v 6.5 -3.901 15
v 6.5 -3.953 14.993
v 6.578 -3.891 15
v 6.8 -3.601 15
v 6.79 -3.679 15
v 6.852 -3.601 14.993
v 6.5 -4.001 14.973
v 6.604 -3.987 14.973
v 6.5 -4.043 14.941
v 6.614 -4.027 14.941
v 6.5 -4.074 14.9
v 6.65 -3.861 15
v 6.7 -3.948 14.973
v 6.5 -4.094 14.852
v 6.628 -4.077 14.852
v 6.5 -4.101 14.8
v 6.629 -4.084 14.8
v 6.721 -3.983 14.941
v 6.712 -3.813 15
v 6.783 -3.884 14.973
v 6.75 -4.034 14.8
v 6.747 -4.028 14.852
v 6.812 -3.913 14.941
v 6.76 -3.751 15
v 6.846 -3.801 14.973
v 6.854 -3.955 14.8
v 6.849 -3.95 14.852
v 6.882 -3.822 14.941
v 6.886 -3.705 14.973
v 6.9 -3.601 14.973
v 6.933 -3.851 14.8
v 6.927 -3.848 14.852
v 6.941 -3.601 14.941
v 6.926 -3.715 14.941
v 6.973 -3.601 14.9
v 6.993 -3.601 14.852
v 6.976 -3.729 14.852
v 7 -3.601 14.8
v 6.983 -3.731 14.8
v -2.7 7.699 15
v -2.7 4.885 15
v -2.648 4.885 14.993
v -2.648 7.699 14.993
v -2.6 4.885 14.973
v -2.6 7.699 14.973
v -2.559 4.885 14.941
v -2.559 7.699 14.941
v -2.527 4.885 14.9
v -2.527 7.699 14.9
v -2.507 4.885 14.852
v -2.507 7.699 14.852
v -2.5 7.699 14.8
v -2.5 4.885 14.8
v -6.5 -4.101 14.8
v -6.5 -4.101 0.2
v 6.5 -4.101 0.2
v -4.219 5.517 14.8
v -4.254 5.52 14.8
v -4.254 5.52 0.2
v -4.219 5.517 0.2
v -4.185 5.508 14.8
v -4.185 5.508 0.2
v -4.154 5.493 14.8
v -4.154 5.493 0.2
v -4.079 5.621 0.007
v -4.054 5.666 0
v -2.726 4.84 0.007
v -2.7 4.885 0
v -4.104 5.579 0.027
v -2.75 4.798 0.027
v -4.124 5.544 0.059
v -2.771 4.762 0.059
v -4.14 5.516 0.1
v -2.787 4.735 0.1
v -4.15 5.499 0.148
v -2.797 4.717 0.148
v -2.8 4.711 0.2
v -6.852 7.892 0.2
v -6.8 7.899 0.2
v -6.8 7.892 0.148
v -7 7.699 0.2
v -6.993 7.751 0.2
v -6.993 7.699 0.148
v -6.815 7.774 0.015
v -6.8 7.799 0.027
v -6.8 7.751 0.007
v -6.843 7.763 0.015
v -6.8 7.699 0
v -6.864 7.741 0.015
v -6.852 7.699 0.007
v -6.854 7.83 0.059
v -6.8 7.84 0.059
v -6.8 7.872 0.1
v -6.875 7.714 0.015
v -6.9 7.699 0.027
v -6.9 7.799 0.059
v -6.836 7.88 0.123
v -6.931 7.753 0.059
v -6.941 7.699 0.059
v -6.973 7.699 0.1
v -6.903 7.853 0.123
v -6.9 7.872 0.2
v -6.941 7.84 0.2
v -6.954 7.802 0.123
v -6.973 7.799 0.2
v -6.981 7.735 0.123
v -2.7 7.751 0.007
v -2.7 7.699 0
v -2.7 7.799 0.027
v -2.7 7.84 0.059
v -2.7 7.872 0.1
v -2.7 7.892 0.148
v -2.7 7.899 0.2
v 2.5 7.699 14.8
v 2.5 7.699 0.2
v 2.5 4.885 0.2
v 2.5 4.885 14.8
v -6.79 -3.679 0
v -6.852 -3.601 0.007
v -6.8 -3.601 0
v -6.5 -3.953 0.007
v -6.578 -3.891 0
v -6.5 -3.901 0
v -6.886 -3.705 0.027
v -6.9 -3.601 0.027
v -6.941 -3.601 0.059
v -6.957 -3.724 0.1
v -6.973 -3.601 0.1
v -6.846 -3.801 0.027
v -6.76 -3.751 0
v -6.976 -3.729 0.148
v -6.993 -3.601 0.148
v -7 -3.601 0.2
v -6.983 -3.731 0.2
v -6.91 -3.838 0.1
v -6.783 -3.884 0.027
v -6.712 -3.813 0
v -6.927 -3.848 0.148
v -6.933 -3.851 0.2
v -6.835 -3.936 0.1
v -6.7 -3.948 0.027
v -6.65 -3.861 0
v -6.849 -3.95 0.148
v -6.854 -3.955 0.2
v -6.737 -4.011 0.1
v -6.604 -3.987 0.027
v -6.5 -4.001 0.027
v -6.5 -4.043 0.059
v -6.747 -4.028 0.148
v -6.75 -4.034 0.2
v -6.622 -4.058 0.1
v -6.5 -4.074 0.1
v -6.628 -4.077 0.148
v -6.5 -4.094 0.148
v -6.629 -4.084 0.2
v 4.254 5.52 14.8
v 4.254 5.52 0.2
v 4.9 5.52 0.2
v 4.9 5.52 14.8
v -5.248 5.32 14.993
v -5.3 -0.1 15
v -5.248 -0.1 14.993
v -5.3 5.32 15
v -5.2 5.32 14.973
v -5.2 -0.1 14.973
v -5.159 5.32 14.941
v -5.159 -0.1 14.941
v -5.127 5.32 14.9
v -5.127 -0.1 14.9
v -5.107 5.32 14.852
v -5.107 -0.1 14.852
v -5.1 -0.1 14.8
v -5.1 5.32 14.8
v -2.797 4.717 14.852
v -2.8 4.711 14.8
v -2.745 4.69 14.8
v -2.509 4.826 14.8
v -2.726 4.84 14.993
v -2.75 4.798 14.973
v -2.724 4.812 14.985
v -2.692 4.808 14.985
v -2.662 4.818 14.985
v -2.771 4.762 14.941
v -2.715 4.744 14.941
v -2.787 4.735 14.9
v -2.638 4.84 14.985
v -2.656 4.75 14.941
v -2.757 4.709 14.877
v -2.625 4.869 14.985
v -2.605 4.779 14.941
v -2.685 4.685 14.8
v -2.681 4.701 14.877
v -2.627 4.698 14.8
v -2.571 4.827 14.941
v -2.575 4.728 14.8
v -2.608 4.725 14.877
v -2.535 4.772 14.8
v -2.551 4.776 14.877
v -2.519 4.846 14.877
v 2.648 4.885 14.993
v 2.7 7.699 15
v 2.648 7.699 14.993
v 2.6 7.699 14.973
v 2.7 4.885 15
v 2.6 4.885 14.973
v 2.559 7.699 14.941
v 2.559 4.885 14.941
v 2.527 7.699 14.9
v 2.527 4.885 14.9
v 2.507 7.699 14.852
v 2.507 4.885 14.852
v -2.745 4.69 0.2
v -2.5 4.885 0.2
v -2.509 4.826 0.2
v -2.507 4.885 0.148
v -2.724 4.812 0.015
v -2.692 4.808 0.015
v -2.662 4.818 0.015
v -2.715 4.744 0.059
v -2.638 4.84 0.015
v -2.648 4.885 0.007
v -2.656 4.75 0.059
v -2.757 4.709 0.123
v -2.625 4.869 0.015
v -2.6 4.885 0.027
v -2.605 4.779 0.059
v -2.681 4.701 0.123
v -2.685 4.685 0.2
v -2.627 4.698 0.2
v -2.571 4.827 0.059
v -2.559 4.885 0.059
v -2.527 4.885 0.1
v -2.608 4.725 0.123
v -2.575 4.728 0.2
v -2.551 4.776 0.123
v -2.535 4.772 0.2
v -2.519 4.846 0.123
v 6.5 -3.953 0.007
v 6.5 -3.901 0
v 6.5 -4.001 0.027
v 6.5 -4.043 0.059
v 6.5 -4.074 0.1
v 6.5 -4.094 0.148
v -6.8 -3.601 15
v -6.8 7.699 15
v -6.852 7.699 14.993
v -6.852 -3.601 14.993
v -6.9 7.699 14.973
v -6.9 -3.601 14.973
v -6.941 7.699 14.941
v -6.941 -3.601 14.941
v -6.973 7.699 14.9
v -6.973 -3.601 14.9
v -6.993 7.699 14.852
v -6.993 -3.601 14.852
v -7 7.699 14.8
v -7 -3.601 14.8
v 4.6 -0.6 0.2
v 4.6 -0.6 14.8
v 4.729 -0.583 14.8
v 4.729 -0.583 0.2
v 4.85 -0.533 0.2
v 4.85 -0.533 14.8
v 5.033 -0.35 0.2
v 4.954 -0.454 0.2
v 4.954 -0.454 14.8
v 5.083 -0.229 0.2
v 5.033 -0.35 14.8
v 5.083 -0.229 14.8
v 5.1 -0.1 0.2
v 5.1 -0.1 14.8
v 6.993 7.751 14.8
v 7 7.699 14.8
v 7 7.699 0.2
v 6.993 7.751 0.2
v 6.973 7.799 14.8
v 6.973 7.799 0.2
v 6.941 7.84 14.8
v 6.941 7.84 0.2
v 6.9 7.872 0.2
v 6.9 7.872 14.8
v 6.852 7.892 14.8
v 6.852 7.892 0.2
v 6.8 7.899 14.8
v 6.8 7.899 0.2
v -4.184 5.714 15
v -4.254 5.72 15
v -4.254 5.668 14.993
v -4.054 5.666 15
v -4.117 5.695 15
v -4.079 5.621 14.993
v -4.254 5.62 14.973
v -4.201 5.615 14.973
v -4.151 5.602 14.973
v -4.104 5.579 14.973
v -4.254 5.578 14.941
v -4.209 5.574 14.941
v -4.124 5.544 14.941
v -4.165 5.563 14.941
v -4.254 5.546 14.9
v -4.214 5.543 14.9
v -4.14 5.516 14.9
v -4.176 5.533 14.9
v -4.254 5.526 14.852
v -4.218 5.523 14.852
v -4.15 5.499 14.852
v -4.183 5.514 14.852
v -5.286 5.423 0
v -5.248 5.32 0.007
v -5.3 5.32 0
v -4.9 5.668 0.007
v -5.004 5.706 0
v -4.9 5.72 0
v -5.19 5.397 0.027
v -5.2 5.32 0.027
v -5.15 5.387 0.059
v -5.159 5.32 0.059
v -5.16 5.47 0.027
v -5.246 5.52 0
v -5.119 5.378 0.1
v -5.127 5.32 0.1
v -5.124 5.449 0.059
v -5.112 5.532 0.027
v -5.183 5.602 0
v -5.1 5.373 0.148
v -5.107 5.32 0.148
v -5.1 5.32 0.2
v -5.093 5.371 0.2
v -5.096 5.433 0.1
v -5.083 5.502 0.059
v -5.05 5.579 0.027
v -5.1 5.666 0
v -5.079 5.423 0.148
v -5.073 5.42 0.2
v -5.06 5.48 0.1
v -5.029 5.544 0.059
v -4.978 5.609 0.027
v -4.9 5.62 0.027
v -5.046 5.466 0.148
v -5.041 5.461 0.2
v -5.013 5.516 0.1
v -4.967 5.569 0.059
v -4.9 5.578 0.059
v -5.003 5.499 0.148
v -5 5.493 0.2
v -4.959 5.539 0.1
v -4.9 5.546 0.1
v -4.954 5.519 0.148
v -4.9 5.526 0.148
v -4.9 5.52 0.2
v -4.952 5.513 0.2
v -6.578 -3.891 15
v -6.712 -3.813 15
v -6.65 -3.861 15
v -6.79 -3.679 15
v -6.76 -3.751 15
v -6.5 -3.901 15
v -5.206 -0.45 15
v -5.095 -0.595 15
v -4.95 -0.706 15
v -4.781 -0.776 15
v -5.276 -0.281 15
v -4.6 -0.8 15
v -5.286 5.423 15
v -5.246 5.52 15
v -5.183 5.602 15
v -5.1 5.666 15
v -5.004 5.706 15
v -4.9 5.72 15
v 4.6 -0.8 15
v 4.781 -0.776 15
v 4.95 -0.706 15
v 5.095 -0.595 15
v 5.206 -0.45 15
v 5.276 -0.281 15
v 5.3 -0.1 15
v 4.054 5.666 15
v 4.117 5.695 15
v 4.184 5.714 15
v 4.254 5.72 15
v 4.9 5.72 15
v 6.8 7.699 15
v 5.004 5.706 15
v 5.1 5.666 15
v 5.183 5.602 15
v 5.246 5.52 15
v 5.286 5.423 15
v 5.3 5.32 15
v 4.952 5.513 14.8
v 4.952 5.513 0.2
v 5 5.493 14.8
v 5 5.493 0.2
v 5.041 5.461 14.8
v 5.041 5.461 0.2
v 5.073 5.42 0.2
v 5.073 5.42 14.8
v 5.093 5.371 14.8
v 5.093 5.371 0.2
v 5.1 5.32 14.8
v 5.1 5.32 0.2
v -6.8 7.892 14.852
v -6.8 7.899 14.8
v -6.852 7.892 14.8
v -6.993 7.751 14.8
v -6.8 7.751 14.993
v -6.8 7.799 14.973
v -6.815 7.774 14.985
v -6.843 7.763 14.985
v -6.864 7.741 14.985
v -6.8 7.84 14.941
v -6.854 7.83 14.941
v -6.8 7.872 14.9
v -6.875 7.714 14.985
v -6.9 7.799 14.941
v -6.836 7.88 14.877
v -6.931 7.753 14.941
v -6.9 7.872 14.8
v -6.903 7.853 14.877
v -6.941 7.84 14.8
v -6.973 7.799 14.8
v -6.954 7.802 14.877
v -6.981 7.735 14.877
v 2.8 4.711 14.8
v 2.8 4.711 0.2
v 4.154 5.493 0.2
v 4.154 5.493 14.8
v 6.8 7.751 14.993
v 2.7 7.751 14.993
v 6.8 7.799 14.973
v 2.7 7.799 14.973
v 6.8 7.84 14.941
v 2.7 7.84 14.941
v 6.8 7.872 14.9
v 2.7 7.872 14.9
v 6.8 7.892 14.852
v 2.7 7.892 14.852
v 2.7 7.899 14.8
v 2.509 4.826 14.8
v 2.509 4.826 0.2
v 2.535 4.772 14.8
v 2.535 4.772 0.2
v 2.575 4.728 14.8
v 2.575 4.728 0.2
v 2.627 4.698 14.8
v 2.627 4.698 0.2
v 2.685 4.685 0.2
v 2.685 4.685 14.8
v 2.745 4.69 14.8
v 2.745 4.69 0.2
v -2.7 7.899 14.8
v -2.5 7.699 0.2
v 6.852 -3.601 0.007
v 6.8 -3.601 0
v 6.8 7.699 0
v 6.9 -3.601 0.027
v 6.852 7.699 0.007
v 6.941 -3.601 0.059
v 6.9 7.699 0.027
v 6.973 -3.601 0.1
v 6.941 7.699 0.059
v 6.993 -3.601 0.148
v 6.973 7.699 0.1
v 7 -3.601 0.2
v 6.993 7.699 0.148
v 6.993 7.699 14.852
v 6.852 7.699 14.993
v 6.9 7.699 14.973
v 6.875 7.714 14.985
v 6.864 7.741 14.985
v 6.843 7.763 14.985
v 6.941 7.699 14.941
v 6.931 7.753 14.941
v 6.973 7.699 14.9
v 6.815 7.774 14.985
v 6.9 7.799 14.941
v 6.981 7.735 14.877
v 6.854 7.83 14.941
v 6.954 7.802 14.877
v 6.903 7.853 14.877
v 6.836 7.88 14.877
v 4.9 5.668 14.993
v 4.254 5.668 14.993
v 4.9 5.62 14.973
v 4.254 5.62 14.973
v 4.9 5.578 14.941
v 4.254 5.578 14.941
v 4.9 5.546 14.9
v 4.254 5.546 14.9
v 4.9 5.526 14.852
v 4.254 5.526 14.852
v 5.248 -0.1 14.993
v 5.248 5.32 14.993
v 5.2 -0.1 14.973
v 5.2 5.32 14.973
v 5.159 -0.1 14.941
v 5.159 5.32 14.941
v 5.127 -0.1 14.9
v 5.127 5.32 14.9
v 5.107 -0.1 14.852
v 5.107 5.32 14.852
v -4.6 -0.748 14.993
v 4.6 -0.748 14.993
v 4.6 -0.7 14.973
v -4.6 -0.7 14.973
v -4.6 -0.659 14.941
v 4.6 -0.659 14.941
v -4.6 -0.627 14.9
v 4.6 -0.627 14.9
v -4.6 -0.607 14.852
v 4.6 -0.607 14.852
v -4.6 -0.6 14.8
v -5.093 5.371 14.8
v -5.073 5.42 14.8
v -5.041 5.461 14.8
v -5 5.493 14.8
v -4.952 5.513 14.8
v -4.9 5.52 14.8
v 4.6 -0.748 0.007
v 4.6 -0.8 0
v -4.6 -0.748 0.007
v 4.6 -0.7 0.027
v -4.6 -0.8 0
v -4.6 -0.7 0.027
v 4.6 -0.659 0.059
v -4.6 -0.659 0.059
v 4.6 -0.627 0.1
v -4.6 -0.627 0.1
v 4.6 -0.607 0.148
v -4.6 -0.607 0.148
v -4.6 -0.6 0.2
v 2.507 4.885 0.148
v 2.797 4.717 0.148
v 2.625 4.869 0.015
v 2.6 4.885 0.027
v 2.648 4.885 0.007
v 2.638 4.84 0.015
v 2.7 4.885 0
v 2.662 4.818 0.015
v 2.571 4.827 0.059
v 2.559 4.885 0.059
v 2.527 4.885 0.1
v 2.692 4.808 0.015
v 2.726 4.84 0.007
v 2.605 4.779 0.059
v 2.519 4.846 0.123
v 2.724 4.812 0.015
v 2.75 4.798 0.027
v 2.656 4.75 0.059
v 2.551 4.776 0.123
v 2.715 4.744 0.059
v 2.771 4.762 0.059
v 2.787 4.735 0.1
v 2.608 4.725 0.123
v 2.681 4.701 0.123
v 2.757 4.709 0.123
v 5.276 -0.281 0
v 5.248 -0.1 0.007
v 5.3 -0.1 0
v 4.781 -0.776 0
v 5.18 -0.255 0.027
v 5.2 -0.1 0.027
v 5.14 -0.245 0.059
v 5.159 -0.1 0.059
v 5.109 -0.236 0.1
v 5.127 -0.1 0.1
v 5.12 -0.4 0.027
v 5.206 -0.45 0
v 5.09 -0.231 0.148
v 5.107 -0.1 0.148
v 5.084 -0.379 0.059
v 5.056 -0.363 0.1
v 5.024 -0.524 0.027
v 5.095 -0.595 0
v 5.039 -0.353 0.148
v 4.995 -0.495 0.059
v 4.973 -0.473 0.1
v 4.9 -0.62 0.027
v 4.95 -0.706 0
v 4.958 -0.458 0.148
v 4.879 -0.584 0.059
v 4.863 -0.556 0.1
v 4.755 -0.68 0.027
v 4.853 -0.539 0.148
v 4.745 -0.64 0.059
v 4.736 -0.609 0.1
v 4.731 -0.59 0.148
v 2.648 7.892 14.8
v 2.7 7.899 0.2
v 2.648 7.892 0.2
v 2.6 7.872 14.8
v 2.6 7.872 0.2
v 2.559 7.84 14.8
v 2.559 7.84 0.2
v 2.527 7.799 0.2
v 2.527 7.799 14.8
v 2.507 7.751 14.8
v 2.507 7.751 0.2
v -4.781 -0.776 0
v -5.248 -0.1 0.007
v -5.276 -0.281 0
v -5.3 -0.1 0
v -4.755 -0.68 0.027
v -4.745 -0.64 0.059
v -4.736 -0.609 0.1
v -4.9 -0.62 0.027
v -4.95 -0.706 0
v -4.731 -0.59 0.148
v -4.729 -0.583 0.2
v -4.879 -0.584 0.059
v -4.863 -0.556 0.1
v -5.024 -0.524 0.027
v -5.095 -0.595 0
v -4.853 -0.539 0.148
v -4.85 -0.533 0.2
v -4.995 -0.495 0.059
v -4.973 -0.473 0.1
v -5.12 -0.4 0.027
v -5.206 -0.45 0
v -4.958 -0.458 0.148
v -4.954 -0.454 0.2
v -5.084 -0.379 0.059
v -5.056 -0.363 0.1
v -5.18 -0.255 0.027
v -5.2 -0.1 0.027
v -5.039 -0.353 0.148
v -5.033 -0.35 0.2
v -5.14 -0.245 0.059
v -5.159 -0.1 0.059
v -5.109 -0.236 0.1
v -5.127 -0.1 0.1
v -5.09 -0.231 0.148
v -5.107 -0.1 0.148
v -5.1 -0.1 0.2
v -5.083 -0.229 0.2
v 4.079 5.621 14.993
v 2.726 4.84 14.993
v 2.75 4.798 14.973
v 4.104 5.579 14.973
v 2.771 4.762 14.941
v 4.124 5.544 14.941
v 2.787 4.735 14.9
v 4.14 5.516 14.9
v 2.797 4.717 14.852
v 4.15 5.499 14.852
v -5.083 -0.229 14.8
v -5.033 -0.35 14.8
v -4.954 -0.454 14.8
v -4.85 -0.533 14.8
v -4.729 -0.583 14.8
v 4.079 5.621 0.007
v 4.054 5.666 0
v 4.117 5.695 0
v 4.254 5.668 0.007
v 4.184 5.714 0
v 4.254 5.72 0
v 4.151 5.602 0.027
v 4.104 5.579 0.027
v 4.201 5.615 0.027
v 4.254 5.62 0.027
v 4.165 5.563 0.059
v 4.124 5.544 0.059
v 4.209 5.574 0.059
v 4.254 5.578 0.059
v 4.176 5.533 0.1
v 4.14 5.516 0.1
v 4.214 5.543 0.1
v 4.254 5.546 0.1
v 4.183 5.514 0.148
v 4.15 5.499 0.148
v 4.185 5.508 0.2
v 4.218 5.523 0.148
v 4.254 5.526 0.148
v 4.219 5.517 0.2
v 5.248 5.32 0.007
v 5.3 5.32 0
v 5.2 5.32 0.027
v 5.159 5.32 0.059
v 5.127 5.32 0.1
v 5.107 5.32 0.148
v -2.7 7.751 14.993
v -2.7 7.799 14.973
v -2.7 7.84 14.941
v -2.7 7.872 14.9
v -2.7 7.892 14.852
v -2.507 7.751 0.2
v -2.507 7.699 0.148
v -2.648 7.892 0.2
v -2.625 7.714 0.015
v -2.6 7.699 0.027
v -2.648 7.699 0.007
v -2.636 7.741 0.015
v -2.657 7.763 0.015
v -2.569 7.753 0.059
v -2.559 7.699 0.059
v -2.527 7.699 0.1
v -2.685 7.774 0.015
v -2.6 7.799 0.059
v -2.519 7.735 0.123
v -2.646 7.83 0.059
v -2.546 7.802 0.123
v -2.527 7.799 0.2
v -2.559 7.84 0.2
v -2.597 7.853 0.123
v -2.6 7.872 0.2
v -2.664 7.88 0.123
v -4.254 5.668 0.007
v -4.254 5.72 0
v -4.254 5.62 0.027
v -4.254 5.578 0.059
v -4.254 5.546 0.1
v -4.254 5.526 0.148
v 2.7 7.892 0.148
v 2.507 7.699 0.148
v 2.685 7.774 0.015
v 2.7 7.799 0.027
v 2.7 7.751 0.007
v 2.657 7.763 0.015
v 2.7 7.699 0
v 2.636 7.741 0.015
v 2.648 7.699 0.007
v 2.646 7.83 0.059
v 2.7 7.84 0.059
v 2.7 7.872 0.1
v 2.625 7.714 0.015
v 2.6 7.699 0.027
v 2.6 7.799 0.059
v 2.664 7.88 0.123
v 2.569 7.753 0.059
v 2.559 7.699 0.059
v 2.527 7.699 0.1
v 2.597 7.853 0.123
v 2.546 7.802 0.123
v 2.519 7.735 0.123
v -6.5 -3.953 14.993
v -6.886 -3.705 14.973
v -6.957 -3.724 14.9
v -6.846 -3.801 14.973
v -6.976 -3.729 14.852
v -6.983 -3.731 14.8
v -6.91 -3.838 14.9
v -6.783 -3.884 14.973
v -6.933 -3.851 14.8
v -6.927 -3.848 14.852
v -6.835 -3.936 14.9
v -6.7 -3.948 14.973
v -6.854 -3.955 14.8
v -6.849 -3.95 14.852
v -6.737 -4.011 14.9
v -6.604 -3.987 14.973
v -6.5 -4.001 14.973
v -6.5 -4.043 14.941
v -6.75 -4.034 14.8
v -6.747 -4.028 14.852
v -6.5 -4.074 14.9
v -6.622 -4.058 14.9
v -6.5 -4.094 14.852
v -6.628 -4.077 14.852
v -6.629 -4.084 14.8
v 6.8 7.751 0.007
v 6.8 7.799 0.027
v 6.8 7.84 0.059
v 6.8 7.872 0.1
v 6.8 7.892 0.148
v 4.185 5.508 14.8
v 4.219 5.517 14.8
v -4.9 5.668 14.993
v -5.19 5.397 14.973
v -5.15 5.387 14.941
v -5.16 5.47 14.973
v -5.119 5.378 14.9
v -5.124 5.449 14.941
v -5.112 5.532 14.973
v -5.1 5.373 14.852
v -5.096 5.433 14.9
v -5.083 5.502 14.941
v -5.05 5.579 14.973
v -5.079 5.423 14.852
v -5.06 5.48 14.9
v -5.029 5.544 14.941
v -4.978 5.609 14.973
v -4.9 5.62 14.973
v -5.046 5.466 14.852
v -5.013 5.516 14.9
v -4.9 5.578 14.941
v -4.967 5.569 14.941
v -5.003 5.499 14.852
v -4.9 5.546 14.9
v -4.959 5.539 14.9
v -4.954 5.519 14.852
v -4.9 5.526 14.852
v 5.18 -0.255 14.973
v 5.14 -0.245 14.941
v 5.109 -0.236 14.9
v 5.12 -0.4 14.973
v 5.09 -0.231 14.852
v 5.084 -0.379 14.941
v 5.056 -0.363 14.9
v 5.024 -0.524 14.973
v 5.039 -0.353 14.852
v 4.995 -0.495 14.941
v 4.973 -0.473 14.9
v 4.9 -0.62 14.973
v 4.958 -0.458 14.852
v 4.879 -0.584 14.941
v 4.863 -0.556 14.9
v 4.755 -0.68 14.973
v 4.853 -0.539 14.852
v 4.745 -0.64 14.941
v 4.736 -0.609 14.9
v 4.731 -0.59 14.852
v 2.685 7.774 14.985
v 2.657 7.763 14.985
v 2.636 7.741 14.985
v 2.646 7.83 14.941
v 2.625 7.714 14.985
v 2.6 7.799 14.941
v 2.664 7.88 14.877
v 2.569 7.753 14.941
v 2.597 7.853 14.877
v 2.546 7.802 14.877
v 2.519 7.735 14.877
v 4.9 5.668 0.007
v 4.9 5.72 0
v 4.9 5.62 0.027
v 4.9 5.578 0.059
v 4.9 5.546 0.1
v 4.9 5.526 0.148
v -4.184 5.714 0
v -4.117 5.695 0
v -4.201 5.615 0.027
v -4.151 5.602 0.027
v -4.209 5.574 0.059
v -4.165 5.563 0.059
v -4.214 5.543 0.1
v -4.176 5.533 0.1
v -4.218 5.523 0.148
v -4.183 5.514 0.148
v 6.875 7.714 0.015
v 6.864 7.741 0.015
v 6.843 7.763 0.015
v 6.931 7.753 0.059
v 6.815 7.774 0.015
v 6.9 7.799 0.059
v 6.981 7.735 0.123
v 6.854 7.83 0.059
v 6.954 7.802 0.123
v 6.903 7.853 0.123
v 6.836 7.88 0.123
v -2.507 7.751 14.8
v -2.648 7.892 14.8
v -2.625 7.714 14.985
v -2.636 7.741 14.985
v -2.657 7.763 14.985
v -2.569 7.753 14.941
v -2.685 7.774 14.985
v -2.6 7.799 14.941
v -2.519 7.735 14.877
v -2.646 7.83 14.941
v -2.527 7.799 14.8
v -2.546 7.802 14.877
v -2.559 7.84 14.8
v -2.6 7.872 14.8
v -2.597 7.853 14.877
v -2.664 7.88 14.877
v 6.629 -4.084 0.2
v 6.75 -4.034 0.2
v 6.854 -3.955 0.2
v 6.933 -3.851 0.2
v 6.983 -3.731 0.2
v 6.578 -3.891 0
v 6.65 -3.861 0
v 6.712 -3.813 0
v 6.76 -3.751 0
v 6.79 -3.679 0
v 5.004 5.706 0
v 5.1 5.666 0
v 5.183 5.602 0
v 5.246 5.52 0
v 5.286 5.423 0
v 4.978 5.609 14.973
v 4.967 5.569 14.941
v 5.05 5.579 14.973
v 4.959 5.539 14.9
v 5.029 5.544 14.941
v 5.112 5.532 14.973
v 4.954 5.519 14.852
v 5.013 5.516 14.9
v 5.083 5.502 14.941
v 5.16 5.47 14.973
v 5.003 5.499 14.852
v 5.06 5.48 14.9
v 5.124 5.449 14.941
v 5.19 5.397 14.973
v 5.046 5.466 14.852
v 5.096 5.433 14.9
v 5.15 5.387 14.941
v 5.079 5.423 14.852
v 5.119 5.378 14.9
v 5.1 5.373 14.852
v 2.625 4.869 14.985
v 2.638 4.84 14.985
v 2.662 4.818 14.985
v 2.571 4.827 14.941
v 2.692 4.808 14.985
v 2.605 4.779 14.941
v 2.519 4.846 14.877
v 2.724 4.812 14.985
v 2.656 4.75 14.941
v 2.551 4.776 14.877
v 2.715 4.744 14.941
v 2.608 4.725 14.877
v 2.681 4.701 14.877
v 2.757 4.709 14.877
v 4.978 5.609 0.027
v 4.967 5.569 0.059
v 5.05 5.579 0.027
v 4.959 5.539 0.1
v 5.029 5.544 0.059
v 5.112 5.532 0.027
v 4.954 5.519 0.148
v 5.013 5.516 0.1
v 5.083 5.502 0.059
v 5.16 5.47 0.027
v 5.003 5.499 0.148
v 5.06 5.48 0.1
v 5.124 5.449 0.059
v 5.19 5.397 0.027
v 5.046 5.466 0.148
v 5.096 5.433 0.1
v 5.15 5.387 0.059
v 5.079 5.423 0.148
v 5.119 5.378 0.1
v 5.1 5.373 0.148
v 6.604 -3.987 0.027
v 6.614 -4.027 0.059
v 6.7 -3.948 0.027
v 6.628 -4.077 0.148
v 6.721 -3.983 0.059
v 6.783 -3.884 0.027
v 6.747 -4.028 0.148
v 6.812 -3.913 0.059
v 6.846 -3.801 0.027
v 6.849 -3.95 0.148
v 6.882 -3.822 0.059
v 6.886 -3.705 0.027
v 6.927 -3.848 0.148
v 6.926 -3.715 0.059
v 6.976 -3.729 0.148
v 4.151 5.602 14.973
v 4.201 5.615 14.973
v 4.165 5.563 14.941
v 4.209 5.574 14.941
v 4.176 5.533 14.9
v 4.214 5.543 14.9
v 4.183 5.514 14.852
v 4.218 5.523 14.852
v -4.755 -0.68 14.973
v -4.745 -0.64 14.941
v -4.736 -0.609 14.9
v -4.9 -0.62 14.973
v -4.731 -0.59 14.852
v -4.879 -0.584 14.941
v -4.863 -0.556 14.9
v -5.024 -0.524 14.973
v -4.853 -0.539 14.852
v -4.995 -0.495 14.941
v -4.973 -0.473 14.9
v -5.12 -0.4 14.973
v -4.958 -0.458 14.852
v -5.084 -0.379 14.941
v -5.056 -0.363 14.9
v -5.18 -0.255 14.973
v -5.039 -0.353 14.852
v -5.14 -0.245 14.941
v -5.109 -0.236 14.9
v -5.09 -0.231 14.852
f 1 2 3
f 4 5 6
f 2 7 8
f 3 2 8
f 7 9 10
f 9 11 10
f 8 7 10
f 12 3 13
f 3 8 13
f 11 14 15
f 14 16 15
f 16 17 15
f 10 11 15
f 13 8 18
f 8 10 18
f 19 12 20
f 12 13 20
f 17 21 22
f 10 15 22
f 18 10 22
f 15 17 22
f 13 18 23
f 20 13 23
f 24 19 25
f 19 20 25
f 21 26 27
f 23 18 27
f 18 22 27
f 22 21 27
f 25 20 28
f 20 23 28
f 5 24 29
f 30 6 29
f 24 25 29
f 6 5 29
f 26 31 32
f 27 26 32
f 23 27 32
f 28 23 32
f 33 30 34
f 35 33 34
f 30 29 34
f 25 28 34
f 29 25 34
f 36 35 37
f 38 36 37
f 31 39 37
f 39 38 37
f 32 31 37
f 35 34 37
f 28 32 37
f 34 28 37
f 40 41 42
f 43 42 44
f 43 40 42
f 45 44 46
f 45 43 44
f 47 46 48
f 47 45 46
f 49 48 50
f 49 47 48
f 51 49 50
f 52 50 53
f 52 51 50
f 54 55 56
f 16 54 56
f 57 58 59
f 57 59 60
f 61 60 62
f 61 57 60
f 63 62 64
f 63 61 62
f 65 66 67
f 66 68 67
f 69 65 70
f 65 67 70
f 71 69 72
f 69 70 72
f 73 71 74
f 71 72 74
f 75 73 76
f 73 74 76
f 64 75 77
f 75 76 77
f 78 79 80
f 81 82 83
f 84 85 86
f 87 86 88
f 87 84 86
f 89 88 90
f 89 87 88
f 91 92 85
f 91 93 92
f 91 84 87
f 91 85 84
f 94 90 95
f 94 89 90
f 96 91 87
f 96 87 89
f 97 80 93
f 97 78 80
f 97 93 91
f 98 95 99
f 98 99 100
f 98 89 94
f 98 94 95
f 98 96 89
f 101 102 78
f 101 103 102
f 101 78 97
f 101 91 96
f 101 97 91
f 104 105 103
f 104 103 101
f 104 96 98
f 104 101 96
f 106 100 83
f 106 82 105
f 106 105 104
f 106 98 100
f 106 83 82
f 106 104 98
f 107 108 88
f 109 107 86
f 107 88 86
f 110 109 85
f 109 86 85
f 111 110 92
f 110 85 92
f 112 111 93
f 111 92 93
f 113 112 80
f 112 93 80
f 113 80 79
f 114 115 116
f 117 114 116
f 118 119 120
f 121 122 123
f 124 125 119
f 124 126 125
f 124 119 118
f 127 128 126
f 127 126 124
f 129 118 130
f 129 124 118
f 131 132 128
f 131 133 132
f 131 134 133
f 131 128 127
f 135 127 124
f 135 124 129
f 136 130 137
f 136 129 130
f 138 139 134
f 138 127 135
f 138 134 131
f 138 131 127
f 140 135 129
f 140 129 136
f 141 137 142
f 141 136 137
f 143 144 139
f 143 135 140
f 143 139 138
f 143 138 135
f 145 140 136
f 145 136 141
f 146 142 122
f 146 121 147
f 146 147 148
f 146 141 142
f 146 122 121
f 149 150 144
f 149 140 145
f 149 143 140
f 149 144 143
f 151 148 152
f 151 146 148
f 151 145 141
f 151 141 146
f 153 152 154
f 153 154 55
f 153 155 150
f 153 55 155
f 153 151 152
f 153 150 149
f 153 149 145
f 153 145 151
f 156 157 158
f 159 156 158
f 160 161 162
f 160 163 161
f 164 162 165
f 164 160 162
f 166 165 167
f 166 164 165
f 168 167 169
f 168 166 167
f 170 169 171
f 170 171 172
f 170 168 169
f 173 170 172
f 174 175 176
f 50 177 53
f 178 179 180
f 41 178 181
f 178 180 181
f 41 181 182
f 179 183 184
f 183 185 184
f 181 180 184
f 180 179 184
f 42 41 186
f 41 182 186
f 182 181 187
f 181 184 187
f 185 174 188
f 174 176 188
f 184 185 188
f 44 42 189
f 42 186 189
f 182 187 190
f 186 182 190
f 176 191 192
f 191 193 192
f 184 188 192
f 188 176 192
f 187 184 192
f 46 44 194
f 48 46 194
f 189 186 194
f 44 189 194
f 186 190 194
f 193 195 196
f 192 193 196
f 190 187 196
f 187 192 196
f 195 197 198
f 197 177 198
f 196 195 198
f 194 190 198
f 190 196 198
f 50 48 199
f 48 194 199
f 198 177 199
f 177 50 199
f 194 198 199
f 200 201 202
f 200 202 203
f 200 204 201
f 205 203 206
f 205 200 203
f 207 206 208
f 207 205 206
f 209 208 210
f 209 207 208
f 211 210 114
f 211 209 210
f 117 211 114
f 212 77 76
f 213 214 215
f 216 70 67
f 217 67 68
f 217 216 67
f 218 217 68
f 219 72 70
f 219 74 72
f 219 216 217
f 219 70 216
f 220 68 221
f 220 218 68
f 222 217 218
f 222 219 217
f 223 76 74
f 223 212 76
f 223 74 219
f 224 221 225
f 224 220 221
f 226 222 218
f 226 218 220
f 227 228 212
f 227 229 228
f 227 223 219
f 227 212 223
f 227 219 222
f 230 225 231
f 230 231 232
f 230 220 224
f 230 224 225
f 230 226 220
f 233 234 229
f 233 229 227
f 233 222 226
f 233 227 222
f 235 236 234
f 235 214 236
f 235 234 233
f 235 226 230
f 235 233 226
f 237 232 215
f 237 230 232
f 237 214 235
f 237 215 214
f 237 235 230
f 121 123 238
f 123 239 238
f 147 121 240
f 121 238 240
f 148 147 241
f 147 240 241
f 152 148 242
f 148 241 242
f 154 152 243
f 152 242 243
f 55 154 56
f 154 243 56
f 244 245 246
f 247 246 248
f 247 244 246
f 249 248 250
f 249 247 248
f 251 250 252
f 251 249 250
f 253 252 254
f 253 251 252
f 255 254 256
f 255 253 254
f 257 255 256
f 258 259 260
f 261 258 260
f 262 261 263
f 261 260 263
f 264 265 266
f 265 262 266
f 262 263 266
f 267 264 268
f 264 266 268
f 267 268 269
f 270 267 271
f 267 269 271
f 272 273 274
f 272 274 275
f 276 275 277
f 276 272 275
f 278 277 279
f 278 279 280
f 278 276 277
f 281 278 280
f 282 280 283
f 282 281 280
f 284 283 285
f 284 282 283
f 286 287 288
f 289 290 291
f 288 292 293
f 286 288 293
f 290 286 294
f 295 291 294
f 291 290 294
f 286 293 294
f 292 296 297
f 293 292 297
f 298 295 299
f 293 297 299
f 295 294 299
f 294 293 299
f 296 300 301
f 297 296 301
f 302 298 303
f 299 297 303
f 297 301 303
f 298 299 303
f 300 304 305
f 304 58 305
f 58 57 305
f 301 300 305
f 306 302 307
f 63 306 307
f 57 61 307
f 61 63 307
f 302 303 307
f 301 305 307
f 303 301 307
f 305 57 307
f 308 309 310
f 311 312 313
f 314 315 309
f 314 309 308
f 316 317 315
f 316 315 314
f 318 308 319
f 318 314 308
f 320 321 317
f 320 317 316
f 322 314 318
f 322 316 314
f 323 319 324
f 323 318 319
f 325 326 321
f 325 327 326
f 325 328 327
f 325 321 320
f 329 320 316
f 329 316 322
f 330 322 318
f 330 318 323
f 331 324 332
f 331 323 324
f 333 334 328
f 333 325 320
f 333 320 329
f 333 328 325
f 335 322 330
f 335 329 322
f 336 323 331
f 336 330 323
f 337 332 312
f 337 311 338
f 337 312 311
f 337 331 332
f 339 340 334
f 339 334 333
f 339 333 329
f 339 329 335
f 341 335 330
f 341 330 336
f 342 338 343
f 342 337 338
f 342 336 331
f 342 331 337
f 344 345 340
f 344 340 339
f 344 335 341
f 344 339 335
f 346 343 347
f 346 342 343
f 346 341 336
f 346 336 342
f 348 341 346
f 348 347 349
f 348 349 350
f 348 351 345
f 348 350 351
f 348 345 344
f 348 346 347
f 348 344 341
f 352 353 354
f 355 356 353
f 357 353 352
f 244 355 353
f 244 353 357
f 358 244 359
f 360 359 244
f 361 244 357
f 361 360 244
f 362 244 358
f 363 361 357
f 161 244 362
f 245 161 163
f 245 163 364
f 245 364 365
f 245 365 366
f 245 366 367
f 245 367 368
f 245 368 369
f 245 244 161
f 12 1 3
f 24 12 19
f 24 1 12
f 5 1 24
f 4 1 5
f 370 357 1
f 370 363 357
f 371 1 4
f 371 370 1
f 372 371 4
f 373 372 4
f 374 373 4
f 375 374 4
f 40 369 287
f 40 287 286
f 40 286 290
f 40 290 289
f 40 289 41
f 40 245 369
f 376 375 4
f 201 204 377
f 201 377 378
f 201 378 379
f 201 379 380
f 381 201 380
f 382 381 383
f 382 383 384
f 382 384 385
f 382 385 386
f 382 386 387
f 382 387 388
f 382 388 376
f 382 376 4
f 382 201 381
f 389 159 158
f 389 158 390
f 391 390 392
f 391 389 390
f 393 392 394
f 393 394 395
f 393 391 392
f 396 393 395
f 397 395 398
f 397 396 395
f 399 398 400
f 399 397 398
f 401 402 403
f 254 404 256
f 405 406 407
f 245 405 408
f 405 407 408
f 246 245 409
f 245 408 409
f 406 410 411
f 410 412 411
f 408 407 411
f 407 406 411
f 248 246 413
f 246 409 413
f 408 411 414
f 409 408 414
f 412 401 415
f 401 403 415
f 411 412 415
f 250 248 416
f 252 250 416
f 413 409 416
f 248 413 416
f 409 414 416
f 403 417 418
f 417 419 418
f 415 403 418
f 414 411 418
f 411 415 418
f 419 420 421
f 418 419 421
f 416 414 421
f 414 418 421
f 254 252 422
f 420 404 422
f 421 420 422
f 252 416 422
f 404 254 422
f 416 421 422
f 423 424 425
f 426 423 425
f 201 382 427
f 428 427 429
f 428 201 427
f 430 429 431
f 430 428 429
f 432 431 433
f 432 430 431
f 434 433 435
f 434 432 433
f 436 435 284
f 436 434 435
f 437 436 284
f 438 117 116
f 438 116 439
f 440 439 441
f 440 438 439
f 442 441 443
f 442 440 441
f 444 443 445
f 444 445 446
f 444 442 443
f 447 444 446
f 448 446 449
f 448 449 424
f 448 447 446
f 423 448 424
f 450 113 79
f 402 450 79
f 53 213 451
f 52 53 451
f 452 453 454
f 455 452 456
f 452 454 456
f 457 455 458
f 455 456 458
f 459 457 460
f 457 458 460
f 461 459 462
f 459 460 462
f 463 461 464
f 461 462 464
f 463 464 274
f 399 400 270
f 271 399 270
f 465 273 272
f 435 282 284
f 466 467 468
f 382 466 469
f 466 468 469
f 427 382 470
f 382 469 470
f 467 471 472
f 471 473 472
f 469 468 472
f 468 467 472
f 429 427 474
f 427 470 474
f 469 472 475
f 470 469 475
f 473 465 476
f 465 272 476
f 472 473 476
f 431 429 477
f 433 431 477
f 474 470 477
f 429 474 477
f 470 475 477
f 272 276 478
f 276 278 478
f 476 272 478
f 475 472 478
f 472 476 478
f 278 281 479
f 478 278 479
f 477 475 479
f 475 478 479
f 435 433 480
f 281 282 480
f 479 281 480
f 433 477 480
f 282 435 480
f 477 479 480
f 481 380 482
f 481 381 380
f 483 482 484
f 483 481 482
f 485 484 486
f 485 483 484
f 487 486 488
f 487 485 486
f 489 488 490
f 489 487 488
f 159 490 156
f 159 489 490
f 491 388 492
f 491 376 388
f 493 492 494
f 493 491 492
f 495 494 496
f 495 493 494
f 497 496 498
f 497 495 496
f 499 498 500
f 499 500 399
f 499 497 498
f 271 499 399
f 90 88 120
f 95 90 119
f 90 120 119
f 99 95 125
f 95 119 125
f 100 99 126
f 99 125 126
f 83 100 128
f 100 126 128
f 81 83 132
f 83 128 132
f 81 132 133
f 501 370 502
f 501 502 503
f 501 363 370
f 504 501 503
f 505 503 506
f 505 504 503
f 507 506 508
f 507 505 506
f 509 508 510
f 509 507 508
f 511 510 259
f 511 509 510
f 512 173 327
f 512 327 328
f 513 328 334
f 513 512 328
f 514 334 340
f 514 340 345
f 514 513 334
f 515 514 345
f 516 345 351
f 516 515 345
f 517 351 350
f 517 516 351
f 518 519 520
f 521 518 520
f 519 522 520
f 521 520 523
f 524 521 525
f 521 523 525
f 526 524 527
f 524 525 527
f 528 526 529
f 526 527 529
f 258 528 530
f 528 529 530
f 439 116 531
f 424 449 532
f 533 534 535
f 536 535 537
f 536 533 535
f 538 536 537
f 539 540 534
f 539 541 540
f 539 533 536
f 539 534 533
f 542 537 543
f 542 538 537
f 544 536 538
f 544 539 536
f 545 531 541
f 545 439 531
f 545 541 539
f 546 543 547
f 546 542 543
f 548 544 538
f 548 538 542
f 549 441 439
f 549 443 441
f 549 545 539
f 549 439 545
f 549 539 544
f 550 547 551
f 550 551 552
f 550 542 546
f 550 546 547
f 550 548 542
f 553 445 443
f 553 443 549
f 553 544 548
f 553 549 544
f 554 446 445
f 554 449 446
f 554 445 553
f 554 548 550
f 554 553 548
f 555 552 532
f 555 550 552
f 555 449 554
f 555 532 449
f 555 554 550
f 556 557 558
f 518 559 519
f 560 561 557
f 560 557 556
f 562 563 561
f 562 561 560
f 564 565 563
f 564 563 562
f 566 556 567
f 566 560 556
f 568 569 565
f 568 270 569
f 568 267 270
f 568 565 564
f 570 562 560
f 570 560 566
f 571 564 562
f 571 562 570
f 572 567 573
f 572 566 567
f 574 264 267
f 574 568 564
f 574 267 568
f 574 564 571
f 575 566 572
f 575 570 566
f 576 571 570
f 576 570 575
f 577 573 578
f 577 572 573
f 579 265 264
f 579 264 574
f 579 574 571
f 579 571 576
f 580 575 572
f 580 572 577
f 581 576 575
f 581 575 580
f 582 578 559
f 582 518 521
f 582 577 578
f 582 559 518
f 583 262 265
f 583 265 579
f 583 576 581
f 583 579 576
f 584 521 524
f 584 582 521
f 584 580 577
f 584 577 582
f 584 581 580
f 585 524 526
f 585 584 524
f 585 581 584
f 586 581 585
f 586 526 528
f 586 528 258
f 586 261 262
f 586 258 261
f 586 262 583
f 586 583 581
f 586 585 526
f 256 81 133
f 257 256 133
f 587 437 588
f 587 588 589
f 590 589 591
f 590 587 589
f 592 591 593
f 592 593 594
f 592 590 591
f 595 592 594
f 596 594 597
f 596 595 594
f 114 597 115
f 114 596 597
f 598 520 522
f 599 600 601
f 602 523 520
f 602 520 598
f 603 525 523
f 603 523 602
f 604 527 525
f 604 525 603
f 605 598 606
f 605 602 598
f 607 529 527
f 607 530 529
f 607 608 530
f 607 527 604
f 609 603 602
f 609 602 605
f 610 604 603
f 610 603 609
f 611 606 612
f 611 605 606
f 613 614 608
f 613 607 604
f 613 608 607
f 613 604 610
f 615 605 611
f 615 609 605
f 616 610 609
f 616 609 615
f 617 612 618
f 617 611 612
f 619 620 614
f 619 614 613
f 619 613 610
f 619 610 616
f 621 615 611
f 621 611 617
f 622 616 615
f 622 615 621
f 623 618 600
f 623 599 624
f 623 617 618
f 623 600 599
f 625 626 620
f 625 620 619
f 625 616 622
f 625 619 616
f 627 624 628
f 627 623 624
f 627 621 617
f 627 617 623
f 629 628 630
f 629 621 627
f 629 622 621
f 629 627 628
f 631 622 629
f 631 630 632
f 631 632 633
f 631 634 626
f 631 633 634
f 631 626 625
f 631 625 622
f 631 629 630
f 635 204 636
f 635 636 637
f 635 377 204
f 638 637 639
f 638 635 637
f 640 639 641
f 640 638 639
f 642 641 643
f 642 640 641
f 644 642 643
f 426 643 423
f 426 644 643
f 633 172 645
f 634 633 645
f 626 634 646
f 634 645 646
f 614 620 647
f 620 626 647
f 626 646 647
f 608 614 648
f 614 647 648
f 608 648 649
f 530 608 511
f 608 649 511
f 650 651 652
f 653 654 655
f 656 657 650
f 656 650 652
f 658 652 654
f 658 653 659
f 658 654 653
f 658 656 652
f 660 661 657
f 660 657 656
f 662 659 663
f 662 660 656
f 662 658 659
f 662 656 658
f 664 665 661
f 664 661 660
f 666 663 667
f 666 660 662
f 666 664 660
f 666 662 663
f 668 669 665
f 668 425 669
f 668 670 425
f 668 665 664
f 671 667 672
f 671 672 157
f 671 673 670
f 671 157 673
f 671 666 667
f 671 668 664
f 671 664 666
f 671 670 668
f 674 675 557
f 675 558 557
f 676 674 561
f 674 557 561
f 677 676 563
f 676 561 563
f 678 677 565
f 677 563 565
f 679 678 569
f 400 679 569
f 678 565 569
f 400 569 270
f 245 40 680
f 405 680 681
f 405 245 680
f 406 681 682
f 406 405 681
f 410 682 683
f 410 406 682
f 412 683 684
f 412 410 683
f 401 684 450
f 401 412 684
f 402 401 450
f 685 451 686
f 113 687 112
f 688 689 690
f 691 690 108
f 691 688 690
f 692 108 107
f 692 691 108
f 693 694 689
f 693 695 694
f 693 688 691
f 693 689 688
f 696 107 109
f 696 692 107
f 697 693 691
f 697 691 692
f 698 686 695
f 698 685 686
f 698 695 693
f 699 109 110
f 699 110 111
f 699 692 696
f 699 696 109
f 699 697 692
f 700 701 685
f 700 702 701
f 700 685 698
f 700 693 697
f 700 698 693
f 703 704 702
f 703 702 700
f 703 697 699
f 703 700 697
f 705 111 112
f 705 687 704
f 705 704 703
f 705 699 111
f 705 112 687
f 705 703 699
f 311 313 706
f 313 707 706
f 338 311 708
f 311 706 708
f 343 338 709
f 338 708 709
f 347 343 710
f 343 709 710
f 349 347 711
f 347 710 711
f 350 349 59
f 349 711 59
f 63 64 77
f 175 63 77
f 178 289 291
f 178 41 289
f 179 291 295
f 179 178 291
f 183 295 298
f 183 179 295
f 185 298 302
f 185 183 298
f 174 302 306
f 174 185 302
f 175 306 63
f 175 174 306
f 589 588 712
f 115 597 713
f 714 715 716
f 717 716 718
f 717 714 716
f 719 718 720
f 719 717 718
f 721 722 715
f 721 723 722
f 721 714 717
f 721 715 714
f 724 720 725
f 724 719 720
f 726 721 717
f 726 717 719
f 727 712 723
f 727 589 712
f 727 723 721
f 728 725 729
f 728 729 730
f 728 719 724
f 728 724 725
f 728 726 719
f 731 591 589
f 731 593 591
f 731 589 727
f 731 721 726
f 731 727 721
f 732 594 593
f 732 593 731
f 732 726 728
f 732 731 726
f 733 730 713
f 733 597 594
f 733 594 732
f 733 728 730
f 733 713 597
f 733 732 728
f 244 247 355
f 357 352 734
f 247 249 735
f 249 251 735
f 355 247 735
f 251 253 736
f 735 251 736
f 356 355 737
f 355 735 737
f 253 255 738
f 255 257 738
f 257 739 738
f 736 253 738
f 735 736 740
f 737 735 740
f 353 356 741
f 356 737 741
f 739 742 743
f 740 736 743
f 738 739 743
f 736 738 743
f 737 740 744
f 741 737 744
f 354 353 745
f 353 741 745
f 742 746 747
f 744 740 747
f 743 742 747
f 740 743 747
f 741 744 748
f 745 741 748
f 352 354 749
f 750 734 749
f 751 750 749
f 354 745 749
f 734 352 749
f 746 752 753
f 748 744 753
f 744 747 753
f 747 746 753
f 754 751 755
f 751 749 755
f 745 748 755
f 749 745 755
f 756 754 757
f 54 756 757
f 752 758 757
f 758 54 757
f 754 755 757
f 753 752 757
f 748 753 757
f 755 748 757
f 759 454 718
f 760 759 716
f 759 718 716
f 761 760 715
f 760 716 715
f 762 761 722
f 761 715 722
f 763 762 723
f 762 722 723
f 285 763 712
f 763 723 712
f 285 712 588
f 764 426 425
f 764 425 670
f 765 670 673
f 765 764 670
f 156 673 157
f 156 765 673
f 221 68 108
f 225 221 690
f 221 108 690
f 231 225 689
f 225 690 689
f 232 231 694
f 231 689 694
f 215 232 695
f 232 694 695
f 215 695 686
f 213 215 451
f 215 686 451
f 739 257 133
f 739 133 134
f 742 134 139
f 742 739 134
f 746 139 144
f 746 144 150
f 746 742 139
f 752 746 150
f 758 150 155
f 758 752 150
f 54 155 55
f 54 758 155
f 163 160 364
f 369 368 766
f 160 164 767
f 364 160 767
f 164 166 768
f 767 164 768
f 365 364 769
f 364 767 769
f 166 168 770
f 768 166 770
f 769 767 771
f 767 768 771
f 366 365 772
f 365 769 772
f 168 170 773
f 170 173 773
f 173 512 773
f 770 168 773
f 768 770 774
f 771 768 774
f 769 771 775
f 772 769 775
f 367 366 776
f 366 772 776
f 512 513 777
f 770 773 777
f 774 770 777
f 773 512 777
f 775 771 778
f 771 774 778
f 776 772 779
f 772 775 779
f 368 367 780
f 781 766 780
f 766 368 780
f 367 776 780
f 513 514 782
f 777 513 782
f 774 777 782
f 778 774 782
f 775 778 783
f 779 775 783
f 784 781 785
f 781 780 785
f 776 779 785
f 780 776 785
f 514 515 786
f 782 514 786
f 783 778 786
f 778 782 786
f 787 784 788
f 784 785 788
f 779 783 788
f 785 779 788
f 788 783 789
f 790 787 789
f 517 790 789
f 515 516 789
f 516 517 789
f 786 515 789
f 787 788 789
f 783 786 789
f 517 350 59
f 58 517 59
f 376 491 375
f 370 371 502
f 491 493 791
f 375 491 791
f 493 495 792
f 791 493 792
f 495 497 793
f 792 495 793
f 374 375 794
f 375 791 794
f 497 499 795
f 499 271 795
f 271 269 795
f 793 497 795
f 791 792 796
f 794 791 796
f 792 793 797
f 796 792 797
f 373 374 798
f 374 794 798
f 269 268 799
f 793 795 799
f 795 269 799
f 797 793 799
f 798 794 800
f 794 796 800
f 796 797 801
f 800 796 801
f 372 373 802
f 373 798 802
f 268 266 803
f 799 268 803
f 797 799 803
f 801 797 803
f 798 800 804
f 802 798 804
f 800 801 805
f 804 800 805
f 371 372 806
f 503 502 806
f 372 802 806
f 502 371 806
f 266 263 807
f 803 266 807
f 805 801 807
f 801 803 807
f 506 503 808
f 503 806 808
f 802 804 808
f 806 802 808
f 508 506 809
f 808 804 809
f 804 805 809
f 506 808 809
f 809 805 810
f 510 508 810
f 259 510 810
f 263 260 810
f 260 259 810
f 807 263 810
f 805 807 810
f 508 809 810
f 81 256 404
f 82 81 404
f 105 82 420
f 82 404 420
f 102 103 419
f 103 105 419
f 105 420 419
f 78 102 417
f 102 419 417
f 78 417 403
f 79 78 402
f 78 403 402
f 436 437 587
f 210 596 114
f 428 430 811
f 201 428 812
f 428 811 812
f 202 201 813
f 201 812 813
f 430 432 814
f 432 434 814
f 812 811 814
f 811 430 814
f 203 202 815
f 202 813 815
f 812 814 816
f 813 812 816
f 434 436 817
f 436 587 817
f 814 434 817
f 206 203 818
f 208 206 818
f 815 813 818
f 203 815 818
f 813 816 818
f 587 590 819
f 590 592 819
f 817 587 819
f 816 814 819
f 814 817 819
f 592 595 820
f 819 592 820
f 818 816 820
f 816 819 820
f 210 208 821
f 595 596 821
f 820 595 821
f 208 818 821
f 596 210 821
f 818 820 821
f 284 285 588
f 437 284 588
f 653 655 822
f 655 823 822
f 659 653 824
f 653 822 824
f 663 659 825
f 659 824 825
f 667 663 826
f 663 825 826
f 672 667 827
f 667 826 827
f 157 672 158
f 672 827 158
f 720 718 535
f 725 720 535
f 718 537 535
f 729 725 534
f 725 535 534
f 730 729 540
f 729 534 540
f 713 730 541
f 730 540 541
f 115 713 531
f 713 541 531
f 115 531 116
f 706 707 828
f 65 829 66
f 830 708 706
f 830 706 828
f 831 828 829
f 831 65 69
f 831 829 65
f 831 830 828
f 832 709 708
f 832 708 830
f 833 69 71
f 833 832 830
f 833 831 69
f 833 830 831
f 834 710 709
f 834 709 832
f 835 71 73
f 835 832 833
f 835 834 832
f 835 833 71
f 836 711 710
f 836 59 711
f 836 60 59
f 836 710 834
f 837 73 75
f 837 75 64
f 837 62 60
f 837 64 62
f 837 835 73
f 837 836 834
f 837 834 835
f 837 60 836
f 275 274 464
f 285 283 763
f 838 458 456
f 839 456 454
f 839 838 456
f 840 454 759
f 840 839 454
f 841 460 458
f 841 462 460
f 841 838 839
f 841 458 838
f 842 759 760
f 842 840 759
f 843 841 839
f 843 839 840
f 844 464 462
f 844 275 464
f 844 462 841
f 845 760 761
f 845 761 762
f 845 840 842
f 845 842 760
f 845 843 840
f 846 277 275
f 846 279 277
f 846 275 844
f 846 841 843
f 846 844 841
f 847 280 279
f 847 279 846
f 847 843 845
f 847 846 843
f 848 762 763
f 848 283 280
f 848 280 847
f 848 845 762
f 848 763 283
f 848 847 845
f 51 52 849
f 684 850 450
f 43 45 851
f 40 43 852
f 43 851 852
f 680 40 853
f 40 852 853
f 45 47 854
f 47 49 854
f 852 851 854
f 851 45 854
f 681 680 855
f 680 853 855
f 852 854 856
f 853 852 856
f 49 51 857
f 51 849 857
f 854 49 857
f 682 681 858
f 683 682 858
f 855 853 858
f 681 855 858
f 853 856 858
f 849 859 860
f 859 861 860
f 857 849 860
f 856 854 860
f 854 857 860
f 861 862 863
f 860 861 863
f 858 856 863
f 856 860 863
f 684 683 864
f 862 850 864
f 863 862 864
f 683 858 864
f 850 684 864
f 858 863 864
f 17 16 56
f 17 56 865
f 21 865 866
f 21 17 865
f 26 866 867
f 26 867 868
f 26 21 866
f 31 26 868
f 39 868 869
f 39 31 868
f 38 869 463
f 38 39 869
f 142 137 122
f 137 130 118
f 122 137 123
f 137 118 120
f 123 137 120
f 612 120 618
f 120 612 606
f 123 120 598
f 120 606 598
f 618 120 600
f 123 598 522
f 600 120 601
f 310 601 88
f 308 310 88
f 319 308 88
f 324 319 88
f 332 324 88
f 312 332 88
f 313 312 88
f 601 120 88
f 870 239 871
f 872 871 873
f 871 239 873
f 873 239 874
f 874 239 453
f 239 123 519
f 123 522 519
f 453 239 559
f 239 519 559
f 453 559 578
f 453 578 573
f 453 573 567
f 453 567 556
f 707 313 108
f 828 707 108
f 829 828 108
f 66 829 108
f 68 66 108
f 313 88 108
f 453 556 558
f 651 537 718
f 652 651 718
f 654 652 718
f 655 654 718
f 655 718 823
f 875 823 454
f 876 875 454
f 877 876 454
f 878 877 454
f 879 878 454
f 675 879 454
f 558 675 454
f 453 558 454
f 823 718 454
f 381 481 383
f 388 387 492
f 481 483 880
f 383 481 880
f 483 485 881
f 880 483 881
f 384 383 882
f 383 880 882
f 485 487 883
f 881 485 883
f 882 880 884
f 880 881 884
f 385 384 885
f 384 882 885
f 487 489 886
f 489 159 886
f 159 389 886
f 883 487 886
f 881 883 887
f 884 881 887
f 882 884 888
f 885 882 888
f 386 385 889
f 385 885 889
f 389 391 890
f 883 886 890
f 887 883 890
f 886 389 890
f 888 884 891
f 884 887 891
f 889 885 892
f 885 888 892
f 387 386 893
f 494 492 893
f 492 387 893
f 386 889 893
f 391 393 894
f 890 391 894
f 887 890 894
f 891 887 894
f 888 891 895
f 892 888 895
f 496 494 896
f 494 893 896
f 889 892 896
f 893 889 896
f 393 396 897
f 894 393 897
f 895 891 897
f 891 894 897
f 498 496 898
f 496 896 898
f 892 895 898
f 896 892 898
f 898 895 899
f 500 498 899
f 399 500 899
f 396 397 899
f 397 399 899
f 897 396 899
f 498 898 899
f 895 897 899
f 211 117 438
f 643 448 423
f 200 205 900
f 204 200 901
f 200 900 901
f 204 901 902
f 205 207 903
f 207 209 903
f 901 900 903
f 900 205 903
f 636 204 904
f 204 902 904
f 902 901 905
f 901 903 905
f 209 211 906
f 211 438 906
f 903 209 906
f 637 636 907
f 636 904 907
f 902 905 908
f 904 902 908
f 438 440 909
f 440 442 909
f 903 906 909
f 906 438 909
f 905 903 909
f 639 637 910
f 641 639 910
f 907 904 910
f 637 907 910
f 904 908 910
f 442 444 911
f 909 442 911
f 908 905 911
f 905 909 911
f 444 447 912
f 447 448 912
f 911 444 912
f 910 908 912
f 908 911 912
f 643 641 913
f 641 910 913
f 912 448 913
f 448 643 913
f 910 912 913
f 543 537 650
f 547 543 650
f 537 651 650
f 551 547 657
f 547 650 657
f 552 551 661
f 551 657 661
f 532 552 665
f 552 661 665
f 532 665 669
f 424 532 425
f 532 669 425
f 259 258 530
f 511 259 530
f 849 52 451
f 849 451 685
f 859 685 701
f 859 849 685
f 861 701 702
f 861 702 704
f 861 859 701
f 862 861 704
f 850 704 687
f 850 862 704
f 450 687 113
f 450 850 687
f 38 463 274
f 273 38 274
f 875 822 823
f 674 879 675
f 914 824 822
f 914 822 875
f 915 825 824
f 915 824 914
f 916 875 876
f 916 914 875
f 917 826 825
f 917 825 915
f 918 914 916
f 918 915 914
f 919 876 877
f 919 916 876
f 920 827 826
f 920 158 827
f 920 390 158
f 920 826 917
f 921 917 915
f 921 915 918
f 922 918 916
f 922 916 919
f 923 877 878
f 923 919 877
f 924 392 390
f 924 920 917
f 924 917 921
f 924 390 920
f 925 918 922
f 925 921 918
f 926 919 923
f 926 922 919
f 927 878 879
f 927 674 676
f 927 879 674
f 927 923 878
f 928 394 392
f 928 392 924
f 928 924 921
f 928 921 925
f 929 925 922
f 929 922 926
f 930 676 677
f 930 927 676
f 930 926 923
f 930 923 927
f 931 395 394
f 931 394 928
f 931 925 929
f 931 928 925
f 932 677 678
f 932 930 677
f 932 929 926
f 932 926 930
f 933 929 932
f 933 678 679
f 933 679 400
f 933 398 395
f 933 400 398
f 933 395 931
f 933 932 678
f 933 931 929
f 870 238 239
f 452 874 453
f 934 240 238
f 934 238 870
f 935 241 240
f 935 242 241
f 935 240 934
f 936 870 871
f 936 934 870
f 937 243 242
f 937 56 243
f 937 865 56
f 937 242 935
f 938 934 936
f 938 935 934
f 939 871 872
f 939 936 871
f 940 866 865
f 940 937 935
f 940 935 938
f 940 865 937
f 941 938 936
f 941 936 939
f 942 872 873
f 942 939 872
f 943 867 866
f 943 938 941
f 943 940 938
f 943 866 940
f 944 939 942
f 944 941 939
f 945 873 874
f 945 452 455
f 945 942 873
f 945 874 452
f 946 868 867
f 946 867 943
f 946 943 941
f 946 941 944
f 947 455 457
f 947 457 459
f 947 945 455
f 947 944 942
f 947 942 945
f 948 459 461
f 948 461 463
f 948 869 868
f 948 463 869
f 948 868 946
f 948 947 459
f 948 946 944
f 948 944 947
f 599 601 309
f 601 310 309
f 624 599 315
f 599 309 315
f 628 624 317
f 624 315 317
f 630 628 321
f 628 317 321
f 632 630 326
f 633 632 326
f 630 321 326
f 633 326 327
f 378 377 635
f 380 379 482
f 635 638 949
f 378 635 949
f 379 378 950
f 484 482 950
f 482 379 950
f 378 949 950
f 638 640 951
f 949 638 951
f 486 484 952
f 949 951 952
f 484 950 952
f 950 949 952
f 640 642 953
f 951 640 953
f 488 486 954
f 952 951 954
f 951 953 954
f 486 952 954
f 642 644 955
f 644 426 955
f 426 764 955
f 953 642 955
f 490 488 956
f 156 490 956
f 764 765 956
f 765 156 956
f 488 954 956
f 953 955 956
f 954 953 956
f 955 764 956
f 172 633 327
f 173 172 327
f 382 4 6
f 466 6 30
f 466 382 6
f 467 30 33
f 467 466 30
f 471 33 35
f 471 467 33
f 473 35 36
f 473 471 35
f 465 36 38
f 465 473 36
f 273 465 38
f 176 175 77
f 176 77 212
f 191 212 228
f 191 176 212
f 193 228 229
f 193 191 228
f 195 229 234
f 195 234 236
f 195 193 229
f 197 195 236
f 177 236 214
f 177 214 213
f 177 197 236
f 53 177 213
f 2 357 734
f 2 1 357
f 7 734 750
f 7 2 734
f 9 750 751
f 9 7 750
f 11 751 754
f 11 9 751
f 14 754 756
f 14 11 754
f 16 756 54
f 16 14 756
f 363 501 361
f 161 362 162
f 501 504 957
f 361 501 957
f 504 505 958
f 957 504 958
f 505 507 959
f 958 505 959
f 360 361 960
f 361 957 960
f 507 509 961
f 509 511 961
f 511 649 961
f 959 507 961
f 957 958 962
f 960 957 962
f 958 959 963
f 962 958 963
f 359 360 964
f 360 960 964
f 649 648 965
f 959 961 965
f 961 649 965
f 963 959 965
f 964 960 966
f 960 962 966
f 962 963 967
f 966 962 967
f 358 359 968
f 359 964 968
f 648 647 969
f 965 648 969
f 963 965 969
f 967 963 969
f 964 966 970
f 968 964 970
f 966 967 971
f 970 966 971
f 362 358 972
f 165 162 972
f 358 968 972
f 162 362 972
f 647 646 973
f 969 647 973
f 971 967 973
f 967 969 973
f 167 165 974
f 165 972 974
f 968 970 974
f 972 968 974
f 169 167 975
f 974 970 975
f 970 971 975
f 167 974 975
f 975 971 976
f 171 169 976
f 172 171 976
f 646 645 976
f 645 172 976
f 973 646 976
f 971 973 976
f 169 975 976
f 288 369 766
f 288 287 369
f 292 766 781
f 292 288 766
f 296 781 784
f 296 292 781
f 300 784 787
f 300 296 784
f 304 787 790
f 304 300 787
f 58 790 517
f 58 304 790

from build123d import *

# Parameters (mm, degrees)
BOSS_EXTRUDE1_DEPTH = 15
FILLET1_R           = 0.2
FILLET2_R           = 0.5
FILLET3_R           = 0.2


with BuildPart() as part:
    # Sketch1 → Boss-Extrude1 (new body)
    with BuildSketch(Plane.XY):
        Polygon((-4.5, 5.519615242), (-4.5, 7.8988893), (-7, 7.8988893), (-7, -4.1011107), (7, -4.1011107), (7, 7.8988893), (4.5, 7.8988893), (4.5, 5.519615242), (5.1, 5.519615242), (5.1, -0.6), (-5.1, -0.6), (-5.1, 5.519615242), align=None)
        Polygon((-2.5, 7.8988893), (-4.5, 7.8988893), (-4.5, 5.519615242), (-4.2, 5.519615242), (-2.5, 4.538119785), align=None)
        Polygon((4.5, 7.8988893), (2.5, 7.8988893), (2.5, 4.538119785), (4.2, 5.519615242), (4.5, 5.519615242), align=None)
    extrude(amount=BOSS_EXTRUDE1_DEPTH)

    # Fillet1
    fillet1_edges = [part.edges().sort_by_distance(p)[0] for p in [
        (4.2, 5.519615242, 7.5),
        (2.5, 4.538119785, 7.5),
        (2.5, 7.8988893, 7.5),
        (7, 7.8988893, 7.5),
        (-7, 7.8988893, 7.5),
        (-2.5, 7.8988893, 7.5),
        (-2.5, 4.538119785, 7.5),
        (-4.2, 5.519615242, 7.5),
        (-5.1, 5.519615242, 7.5),
        (5.1, 5.519615242, 7.5),
    ]]
    fillet(fillet1_edges, radius=FILLET1_R)

    # Fillet2
    fillet2_edges = [part.edges().sort_by_distance(p)[0] for p in [
        (7, -4.1011107, 7.5),
        (-7, -4.1011107, 7.5),
        (-5.1, -0.6, 7.5),
        (5.1, -0.6, 7.5),
    ]]
    fillet(fillet2_edges, radius=FILLET2_R)

    # Fillet3
    fillet3_edges = [part.edges().sort_by_distance(p)[0] for p in [
        (0, -4.1011107, 0),
        (0, -4.1011107, 15),
        (0, -0.6, 0),
        (5.1, 2.609807621, 0),
        (7, 2.0488893, 0),
        (6.853553391, -3.95466409, 0),
        (-6.853553391, -3.95466409, 0),
        (7, 2.0488893, 15),
        (5.1, 2.609807621, 15),
        (0, -0.6, 15),
        (6.853553391, -3.95466409, 15),
        (-6.853553391, -3.95466409, 15),
        (-4.953553391, -0.453553391, 0),
        (-4.953553391, -0.453553391, 15),
        (4.953553391, -0.453553391, 0),
        (4.953553391, -0.453553391, 15),
        (4.576794919, 5.519615242, 0),
        (4.576794919, 5.519615242, 15),
        (3.476794919, 5.102072594, 0),
        (3.476794919, 5.102072594, 15),
        (-3.476794919, 5.102072594, 0),
        (-3.476794919, 5.102072594, 15),
        (-4.576794919, 5.519615242, 0),
        (-4.576794919, 5.519615242, 15),
        (-5.1, 2.609807621, 0),
        (-5.1, 2.609807621, 15),
        (-7, 2.0488893, 0),
        (-7, 2.0488893, 15),
        (2.5, 6.291709623, 0),
        (4.75, 7.8988893, 0),
        (-4.75, 7.8988893, 0),
        (-2.5, 6.291709623, 0),
        (2.6, 4.711324865, 0),
        (-2.6, 4.711324865, 0),
        (-2.558578644, 7.840310656, 0),
        (2.558578644, 7.840310656, 0),
        (6.941421356, 7.840310656, 0),
        (-6.941421356, 7.840310656, 0),
        (-4.75, 7.8988893, 15),
        (-2.5, 6.291709623, 15),
        (4.75, 7.8988893, 15),
        (2.5, 6.291709623, 15),
        (2.6, 4.711324865, 15),
        (-2.6, 4.711324865, 15),
        (-2.558578644, 7.840310656, 15),
        (2.558578644, 7.840310656, 15),
        (6.941421356, 7.840310656, 15),
        (-6.941421356, 7.840310656, 15),
        (5.041421356, 5.461036599, 0),
        (5.041421356, 5.461036599, 15),
        (4.201826029, 5.512800408, 0),
        (4.201826029, 5.512800408, 15),
        (-4.201826029, 5.512800408, 0),
        (-4.201826029, 5.512800408, 15),
        (-5.041421356, 5.461036599, 0),
        (-5.041421356, 5.461036599, 15),
    ]]
    fillet(fillet3_edges, radius=FILLET3_R)


solid = part.part
